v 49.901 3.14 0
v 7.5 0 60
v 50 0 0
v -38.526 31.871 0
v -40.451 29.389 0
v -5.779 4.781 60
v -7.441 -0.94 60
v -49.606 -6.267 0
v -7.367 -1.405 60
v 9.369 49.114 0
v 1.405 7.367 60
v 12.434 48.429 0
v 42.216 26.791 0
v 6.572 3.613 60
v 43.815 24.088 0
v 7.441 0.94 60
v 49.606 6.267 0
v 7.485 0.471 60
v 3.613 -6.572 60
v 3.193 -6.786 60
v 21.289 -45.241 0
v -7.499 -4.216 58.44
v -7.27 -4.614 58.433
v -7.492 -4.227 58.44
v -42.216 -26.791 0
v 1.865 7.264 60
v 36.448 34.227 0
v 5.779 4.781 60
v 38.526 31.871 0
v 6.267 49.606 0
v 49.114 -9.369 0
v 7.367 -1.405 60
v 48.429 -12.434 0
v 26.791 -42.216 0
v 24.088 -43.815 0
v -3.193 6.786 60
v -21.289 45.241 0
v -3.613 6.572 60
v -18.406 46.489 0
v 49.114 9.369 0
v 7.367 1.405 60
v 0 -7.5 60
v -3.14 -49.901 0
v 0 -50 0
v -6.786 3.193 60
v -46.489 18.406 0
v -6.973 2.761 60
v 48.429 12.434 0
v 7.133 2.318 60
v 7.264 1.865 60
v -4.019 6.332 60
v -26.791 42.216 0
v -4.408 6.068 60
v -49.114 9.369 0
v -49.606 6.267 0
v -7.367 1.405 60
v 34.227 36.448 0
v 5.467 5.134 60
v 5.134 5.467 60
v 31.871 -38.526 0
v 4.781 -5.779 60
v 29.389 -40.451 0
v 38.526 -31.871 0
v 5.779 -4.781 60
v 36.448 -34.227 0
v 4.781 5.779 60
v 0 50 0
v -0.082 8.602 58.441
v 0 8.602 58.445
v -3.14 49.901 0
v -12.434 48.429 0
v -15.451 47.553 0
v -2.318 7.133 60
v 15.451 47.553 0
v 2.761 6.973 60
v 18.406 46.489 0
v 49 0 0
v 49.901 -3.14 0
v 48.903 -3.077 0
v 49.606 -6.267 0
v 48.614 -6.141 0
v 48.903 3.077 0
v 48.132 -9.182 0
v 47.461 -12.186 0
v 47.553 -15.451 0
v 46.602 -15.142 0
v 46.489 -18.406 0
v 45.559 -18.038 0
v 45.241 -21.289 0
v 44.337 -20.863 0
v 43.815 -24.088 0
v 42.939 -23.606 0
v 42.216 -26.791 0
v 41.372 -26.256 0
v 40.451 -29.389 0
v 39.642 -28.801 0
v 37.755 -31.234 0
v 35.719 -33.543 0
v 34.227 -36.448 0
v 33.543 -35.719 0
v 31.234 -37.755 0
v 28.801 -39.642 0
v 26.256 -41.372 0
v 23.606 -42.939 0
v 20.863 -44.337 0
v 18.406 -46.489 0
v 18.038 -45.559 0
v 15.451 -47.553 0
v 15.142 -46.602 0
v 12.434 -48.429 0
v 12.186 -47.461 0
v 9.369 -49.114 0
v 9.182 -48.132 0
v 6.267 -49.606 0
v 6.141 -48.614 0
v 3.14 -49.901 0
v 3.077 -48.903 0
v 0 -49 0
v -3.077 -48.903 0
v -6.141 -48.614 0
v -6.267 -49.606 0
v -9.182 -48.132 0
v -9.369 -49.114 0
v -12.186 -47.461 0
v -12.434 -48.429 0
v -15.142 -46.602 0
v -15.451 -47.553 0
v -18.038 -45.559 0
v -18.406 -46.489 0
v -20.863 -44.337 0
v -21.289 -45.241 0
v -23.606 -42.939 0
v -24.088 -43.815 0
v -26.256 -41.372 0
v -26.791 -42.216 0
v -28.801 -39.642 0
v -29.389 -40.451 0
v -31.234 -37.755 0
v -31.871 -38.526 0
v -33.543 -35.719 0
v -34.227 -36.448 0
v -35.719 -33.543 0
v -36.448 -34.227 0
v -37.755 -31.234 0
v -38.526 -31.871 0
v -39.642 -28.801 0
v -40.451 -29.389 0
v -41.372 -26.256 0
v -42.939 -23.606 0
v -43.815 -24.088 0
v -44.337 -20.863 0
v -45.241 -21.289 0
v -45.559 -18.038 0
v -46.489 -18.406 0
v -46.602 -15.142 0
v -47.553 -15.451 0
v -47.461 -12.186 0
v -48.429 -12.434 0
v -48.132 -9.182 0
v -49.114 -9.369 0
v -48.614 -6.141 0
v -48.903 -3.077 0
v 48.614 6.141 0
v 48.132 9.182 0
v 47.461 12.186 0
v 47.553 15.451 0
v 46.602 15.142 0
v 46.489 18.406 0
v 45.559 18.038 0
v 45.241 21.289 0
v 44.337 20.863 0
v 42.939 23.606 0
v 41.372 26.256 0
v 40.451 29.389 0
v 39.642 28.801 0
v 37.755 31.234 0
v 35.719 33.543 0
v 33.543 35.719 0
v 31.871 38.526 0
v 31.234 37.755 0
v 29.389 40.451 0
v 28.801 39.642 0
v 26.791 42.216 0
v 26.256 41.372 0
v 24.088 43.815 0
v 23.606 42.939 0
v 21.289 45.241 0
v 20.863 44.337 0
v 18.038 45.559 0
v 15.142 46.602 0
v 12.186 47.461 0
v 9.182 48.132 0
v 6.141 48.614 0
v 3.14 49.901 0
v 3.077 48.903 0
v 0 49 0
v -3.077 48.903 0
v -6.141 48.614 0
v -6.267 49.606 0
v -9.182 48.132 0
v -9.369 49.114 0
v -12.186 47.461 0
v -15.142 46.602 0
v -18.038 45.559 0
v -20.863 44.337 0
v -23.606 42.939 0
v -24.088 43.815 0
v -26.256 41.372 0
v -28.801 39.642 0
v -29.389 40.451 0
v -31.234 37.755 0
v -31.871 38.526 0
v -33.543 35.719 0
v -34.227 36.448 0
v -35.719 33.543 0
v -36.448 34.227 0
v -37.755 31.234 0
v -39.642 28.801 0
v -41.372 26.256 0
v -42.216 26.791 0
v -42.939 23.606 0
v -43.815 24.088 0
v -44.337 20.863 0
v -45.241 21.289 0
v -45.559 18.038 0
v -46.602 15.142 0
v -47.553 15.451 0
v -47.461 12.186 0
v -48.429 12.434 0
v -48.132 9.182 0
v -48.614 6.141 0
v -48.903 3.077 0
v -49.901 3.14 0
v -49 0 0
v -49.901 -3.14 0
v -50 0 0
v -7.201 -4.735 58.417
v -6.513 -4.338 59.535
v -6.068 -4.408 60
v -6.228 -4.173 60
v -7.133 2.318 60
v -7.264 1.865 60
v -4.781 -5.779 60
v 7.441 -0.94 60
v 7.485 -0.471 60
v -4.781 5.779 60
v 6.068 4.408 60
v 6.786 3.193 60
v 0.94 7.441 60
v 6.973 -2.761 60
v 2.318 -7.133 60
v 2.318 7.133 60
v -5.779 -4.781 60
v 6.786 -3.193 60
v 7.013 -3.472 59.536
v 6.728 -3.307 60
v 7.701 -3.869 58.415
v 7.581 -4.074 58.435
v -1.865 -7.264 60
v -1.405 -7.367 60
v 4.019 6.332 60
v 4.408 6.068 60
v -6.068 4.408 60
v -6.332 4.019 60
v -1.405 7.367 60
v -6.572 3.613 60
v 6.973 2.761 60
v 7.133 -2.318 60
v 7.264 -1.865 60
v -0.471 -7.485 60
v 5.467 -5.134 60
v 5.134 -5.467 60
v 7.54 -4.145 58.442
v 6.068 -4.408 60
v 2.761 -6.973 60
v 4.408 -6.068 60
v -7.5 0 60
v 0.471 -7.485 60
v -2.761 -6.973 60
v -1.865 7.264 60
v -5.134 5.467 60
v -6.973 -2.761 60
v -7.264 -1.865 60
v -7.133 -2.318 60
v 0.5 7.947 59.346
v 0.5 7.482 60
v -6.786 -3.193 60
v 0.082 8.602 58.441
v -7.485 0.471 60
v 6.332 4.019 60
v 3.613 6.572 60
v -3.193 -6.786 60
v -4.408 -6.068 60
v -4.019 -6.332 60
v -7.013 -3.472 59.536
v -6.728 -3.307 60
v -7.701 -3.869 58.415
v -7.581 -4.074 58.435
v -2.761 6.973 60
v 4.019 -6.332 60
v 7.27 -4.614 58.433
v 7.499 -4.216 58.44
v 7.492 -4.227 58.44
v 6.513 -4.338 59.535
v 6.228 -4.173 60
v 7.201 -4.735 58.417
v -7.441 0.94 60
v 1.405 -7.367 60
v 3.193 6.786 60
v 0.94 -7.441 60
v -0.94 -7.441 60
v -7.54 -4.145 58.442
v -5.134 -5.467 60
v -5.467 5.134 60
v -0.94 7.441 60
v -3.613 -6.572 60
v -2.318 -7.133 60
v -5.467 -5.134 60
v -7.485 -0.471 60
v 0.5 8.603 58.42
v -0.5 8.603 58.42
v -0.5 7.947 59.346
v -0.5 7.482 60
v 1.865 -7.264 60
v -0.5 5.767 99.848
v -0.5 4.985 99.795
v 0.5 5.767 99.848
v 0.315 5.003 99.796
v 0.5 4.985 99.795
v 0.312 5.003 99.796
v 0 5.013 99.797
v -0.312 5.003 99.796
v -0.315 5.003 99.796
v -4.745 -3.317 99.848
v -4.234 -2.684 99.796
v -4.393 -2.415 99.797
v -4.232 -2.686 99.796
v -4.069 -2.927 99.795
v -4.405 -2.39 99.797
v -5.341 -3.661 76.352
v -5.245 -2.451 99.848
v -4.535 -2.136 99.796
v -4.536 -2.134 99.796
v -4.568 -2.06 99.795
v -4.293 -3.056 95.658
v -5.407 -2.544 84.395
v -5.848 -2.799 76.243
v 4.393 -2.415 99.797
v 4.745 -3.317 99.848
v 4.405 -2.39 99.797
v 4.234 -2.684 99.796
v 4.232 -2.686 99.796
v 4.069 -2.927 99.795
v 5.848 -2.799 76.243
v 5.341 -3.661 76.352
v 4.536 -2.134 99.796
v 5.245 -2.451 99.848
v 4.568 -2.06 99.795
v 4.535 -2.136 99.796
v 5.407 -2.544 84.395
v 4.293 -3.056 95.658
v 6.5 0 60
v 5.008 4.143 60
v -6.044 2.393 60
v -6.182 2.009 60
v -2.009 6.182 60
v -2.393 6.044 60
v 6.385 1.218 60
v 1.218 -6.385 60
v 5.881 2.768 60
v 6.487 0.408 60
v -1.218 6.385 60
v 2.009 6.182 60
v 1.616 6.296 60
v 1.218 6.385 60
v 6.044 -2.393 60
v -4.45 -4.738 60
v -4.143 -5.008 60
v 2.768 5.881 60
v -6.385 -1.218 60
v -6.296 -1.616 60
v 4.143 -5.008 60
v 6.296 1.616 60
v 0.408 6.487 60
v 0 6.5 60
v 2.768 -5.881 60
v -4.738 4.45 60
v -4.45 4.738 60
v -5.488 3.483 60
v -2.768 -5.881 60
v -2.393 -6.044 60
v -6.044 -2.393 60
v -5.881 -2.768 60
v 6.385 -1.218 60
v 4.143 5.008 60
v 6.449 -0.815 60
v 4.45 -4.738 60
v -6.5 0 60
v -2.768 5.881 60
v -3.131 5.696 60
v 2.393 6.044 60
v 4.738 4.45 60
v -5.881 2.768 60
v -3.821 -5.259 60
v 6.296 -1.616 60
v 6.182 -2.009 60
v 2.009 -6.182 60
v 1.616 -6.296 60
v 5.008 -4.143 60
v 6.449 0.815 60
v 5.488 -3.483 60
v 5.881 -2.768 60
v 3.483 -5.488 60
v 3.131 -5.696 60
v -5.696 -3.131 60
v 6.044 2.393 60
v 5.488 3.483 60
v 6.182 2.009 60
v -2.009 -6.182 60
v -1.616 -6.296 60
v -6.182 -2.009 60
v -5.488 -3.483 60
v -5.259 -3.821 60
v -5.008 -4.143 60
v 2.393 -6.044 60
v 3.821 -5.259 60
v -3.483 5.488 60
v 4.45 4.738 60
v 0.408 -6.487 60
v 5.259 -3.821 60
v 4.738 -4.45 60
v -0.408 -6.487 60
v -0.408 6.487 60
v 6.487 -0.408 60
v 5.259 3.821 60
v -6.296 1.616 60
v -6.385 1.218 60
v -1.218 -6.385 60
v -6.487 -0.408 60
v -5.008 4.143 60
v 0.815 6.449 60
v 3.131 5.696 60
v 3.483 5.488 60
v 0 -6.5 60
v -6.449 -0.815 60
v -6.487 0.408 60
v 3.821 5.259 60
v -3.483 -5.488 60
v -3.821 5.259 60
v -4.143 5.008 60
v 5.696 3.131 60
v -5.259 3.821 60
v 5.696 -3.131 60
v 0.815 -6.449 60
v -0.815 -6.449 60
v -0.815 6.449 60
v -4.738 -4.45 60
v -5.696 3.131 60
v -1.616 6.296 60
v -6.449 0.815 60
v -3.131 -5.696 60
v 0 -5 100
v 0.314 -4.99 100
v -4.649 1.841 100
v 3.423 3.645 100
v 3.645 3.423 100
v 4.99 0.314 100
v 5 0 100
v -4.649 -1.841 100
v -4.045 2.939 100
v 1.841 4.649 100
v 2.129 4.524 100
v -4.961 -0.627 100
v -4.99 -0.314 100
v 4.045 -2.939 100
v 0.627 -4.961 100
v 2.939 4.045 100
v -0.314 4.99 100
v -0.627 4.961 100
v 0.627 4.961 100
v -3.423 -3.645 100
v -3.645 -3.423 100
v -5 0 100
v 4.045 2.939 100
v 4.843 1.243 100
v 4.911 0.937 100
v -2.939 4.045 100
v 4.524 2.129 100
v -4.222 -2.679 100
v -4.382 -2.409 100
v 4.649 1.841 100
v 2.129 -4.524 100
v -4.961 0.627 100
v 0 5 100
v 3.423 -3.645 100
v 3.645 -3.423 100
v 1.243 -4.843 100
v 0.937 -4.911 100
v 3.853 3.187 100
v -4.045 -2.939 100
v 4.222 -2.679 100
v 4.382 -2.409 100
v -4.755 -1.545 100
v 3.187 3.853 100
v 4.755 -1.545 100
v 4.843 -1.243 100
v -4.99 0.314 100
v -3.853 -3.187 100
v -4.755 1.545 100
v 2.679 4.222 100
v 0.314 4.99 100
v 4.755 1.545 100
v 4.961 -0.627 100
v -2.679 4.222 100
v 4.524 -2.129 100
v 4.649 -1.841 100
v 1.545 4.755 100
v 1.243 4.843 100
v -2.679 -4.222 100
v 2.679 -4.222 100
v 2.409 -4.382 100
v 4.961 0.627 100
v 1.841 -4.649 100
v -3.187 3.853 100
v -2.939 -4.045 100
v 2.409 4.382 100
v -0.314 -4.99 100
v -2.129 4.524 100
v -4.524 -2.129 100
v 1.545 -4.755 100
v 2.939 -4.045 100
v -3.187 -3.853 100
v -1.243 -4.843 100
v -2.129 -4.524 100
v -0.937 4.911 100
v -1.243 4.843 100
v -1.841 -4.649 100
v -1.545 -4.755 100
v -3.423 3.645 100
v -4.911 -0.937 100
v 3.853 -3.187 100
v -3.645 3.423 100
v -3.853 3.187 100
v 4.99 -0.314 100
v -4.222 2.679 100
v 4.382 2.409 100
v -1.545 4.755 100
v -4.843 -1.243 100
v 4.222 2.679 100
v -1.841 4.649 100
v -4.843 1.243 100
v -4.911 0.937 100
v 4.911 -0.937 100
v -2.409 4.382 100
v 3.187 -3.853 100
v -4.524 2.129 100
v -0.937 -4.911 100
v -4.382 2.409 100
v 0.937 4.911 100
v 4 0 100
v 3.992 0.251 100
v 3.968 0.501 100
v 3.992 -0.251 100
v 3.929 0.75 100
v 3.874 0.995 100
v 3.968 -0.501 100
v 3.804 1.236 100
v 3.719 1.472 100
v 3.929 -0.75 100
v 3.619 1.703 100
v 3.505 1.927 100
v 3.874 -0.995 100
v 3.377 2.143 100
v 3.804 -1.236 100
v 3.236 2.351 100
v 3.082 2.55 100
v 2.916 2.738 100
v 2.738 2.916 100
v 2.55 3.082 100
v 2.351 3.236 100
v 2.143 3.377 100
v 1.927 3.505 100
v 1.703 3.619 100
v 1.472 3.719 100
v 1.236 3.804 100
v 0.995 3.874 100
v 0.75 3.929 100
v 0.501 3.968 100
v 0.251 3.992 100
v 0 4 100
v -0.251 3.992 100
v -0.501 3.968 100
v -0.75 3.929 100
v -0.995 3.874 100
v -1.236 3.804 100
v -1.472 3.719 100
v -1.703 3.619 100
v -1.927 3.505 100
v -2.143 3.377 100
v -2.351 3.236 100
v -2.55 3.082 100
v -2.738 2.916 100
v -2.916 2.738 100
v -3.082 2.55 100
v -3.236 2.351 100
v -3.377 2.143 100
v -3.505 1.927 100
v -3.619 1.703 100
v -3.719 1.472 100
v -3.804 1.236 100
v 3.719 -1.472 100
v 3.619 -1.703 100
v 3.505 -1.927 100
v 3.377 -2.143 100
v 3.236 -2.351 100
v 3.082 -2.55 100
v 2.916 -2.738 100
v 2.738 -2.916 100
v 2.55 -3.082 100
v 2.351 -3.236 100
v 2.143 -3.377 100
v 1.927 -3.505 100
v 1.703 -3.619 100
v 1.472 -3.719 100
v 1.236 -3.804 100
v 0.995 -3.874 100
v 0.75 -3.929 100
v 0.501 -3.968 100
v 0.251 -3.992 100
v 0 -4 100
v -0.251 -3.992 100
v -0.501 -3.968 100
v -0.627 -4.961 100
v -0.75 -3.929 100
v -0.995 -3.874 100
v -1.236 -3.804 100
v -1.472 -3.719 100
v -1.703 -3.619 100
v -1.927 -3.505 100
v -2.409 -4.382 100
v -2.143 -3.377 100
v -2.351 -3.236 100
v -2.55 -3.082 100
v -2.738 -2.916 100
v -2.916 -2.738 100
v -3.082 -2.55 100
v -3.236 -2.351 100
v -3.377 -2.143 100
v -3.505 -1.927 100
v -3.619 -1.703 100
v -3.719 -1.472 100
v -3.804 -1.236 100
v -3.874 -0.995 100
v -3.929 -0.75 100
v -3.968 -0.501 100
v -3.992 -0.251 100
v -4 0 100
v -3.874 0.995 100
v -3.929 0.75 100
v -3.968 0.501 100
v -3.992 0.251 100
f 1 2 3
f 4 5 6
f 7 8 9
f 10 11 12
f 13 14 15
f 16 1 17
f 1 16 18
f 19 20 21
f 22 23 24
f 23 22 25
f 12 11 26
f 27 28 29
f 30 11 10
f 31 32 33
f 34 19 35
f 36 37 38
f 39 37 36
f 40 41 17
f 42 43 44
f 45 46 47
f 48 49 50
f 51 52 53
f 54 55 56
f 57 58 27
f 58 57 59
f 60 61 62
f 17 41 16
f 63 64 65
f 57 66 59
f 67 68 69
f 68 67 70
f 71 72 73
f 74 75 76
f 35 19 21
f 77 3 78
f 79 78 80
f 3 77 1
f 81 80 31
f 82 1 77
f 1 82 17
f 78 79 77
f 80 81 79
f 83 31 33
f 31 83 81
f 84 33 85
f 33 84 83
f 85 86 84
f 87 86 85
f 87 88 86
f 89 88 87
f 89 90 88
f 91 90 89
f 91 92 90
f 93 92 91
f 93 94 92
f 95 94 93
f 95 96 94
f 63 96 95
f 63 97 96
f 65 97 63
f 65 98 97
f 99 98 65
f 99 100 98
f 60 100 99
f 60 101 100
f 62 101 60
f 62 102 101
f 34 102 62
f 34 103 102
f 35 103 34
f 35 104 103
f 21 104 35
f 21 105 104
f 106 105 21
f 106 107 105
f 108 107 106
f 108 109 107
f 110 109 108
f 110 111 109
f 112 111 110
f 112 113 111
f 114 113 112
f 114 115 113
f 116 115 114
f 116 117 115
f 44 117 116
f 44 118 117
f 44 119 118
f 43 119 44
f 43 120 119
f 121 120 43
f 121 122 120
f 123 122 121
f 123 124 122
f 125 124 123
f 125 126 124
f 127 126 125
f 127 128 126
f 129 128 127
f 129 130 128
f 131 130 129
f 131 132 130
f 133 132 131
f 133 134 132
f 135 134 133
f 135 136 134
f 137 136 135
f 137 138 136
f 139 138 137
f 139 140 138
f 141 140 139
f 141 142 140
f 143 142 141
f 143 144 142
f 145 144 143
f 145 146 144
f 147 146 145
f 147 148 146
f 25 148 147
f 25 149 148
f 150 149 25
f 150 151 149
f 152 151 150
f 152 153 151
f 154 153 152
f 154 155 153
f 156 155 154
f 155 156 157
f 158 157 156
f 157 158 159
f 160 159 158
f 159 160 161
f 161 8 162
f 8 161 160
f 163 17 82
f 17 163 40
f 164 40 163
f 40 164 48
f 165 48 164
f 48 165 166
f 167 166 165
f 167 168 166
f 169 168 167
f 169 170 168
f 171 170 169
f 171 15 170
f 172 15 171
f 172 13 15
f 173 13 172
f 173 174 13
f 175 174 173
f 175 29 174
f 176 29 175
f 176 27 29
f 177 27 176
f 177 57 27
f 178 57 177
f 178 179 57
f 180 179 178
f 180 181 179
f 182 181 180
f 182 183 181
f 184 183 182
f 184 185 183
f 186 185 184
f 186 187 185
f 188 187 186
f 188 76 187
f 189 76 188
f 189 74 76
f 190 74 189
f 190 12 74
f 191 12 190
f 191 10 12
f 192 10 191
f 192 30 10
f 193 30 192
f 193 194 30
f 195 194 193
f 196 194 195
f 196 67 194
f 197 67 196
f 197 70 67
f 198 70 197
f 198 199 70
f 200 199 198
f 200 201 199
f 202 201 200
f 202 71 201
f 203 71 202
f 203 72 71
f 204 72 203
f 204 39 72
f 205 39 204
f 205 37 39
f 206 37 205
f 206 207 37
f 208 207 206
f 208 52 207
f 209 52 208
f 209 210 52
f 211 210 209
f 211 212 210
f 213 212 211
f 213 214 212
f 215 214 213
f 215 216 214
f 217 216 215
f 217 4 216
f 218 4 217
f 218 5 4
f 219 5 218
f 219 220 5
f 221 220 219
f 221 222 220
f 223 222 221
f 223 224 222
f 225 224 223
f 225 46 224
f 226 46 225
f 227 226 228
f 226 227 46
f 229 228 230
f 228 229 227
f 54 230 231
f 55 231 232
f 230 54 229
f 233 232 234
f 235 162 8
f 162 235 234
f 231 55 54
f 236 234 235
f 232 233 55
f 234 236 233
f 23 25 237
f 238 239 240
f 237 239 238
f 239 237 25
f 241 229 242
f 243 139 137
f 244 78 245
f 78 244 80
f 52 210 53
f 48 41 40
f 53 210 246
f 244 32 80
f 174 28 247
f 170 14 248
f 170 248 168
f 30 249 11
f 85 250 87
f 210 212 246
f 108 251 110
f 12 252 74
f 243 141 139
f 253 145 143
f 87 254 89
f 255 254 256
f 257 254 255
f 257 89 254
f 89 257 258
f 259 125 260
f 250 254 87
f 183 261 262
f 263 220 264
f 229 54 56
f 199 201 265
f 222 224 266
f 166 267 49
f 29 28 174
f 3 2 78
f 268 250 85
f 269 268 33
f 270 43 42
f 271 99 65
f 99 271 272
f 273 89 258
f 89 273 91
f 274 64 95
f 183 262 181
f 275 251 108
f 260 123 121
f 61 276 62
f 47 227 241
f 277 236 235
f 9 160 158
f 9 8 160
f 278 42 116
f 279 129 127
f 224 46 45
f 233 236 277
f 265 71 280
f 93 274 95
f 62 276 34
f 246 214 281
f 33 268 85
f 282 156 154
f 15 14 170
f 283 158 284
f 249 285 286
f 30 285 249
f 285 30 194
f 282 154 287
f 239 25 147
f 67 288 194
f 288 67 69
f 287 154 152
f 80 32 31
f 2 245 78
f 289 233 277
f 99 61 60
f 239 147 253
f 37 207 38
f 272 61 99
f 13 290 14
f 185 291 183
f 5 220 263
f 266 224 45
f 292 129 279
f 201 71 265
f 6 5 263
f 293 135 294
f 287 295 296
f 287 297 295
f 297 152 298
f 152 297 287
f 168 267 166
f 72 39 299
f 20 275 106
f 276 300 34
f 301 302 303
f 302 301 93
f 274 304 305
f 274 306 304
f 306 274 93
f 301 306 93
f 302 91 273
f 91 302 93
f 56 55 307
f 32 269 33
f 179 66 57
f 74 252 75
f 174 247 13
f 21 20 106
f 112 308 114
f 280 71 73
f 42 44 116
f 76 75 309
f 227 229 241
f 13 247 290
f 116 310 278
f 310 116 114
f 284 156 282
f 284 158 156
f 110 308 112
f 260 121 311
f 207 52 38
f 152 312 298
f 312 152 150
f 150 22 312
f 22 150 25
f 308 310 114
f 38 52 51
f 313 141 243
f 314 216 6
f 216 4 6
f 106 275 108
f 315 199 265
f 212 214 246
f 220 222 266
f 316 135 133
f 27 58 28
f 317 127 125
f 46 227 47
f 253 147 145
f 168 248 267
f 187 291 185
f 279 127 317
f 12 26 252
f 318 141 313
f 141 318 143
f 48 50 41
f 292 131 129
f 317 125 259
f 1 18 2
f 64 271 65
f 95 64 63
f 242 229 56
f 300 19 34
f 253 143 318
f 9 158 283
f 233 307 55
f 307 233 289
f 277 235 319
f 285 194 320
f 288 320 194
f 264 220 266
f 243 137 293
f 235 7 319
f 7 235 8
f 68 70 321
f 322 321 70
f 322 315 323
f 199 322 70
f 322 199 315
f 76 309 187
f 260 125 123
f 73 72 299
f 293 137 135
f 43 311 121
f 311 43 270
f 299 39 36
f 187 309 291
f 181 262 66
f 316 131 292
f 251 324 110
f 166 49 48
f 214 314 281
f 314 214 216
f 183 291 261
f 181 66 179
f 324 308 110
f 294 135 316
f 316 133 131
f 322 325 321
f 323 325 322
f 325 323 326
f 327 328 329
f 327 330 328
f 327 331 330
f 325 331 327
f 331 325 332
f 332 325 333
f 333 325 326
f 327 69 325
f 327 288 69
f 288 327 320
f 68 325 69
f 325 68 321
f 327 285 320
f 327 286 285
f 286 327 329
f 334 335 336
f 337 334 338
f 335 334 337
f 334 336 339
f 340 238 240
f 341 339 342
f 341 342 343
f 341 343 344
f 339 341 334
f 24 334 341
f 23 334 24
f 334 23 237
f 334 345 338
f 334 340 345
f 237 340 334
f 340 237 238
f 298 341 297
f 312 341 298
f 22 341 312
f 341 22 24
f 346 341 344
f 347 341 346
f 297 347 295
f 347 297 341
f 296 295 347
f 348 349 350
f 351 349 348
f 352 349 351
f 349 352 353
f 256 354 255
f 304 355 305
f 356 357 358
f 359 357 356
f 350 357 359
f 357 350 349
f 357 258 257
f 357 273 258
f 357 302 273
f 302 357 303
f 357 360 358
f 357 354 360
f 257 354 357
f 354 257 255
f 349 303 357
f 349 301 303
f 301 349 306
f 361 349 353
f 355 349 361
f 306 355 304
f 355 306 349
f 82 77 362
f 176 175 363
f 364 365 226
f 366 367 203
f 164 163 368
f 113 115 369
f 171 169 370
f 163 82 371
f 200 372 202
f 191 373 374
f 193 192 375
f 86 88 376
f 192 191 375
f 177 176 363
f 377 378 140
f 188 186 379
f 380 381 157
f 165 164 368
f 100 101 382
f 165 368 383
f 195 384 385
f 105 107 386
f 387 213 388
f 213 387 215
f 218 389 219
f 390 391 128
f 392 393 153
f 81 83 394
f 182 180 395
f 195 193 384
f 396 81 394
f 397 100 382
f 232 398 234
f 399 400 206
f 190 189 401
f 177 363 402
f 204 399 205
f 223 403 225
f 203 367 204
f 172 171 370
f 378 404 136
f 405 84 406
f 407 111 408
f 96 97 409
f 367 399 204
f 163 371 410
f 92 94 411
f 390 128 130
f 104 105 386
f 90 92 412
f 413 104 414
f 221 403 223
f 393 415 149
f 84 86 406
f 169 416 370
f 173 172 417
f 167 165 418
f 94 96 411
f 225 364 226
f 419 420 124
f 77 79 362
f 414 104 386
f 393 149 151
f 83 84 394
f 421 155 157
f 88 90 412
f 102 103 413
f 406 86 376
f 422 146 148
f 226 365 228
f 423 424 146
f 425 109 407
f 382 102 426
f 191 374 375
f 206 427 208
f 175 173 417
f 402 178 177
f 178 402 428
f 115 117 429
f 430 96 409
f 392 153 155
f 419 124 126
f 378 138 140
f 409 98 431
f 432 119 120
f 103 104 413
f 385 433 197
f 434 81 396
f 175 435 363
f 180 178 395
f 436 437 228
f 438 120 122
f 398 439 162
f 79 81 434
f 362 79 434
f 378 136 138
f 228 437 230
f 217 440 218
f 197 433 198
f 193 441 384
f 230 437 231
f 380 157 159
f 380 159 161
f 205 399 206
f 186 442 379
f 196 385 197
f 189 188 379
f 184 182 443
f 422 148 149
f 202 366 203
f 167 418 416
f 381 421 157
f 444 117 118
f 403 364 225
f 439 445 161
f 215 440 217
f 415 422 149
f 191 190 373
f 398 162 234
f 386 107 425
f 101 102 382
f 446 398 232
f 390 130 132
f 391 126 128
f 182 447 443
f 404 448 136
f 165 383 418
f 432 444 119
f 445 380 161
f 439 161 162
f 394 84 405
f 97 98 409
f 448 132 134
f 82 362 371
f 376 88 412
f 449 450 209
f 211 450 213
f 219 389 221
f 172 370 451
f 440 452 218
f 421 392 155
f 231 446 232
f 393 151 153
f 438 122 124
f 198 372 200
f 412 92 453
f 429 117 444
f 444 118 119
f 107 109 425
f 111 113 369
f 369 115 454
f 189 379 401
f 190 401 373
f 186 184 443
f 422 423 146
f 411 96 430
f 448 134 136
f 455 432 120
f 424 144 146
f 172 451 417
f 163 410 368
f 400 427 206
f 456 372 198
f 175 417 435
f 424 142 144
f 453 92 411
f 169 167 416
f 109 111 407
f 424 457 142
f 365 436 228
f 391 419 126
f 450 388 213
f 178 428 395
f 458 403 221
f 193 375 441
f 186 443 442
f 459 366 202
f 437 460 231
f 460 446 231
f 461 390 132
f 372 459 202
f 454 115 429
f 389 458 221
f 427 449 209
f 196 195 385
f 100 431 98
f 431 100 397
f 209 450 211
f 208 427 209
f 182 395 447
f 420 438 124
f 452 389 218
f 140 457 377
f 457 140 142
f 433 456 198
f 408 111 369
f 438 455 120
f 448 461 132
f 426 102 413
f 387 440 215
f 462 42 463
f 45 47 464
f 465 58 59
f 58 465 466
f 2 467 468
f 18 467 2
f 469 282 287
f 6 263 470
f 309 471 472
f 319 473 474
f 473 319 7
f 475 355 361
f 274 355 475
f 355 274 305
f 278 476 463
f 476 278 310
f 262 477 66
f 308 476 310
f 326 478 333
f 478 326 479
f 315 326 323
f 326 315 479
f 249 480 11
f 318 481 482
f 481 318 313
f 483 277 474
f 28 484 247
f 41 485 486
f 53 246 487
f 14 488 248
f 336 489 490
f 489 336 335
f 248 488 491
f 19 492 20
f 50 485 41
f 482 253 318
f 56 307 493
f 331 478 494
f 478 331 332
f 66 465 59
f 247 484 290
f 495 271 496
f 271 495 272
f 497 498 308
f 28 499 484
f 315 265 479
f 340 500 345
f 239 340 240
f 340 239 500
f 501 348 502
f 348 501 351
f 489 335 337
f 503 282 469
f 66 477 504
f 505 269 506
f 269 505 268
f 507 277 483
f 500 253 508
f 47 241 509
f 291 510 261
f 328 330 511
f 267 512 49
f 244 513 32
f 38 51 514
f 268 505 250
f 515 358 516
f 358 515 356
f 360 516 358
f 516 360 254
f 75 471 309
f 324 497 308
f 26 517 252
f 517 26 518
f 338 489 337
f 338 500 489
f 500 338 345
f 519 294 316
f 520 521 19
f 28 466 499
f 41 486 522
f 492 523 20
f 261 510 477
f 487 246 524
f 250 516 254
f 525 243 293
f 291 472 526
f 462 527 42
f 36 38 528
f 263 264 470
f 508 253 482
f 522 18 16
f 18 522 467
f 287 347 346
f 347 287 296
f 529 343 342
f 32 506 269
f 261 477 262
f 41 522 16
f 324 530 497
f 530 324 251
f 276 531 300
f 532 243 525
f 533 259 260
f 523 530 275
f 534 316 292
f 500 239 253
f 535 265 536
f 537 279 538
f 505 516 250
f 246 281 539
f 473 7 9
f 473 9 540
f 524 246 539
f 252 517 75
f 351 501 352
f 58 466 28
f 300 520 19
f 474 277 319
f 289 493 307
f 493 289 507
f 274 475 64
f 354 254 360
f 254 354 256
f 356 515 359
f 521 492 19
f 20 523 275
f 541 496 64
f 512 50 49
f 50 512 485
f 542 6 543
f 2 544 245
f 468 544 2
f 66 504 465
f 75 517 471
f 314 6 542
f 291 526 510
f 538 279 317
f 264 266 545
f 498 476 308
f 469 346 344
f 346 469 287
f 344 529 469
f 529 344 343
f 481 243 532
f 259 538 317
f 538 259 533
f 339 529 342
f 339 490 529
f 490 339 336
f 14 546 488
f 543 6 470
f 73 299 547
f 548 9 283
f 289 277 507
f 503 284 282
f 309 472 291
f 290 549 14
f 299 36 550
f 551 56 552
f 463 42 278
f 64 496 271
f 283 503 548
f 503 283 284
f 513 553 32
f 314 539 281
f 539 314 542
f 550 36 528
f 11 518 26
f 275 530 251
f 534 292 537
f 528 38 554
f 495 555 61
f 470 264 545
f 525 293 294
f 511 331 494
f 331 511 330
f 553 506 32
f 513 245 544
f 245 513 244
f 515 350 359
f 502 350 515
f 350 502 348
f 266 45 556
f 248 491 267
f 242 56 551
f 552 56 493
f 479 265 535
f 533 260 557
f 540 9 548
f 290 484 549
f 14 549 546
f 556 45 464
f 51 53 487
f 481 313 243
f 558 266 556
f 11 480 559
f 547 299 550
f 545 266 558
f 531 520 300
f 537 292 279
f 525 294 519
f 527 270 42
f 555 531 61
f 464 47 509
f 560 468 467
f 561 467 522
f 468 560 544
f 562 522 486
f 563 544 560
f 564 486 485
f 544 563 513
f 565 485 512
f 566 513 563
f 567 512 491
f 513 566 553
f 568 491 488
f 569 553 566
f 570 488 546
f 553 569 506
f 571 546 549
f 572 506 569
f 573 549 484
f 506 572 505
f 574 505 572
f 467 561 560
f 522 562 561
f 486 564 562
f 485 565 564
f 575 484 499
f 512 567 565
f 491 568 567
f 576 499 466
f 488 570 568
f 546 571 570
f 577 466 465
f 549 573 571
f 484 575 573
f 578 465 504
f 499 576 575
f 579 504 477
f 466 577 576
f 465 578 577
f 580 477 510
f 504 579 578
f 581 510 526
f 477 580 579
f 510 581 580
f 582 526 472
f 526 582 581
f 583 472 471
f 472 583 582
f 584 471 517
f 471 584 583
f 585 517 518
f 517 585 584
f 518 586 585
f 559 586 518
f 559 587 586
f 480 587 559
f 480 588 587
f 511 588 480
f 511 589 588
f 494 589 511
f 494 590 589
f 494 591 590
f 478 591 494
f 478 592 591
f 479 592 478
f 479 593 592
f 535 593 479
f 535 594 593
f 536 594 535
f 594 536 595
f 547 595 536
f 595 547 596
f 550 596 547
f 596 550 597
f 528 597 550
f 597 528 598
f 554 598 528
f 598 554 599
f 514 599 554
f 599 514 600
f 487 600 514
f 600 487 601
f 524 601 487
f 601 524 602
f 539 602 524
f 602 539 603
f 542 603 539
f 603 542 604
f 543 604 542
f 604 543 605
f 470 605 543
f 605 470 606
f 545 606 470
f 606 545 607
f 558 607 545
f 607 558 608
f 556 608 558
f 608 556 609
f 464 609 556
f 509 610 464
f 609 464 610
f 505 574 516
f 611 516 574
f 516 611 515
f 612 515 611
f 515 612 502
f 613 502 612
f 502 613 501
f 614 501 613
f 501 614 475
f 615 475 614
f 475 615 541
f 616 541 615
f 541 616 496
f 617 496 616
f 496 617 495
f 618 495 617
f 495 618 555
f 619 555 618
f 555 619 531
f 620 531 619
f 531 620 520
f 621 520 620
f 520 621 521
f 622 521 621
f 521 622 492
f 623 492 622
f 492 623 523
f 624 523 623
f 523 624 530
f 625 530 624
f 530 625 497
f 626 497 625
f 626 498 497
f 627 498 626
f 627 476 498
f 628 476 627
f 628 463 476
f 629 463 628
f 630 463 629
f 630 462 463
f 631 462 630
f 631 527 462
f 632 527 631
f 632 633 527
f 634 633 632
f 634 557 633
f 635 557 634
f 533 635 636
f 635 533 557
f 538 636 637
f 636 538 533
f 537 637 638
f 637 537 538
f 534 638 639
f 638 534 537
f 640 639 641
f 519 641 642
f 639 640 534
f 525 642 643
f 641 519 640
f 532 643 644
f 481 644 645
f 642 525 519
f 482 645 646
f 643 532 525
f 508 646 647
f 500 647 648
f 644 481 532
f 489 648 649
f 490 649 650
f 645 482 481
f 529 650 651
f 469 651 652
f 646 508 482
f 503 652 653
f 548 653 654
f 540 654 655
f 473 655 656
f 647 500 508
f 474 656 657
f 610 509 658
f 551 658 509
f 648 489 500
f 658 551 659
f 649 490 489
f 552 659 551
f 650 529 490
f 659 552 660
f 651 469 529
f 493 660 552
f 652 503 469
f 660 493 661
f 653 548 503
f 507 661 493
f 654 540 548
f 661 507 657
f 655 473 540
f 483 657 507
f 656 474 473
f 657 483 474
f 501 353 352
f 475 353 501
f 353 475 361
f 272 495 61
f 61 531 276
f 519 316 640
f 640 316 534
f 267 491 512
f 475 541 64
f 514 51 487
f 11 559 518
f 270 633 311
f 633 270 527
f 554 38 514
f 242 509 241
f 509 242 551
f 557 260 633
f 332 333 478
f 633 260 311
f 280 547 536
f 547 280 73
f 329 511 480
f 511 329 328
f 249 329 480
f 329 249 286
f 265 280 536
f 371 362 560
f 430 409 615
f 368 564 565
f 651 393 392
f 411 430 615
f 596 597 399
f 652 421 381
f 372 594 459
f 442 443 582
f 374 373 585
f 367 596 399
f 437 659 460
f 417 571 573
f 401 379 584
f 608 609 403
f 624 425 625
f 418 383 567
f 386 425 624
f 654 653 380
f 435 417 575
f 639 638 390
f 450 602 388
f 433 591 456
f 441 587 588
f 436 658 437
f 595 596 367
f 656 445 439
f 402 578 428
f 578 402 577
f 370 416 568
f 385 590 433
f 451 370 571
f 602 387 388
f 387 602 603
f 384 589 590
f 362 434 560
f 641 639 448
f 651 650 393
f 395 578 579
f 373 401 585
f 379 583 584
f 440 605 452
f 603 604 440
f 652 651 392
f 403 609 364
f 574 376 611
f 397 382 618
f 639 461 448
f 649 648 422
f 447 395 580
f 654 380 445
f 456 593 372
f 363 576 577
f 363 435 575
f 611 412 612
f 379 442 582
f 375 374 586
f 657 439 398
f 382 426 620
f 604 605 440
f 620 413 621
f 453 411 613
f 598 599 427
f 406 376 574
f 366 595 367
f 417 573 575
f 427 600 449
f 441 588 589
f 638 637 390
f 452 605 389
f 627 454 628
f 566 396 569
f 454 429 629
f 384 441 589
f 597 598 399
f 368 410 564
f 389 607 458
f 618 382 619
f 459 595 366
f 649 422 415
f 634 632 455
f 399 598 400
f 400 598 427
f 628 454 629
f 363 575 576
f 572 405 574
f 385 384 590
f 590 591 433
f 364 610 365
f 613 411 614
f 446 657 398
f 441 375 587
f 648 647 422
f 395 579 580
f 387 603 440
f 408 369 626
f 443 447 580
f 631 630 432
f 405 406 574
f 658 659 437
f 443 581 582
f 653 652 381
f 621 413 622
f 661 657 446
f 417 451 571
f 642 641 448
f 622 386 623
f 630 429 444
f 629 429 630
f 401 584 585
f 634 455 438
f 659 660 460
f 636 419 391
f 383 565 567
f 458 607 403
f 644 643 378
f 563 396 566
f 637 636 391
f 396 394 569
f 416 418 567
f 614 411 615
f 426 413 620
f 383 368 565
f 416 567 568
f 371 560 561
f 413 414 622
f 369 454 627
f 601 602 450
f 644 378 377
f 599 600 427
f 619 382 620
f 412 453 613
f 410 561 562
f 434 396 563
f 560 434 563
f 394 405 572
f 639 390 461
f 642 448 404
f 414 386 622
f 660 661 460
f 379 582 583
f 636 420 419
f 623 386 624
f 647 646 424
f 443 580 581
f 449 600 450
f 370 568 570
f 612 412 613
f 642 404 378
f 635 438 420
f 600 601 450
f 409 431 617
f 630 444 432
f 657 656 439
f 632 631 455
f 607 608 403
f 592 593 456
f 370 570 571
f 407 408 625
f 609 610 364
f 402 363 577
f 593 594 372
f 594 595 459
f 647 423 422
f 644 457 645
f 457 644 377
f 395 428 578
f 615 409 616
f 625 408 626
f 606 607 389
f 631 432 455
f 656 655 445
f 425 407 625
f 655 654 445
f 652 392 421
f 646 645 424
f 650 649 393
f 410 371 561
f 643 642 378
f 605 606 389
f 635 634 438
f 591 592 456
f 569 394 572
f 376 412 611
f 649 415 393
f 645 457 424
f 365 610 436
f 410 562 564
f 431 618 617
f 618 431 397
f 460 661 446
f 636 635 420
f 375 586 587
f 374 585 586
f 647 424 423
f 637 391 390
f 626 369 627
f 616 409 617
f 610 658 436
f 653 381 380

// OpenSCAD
// variables
size = 100; // [50:S,100:M,150:L,200:XL]
wallthickness = 1; // [0.5:S,1:M,1.5:L]
resolution = 100; // [100:rough,150:middle,200:fine]

// model
union(){
	difference(){
		union(){
			translate([0,0,0])cylinder(h = size*0.6, r1 = size/2, r2 = size*0.15/2, $fn = resolution);
			translate([-0.5,-0.6,0]) translate([0,size*0.12,0]) rotate([1/tan(size*0.1/(size*0.4)*180/PI),0,0]) cube([1,1.2,size]);
			rotate([0,0,120]) translate([-0.5,-0.6,0]) translate([0,size*0.12,0]) rotate([1/tan(size*0.1/(size*0.4)*180/PI),0,0]) cube([1,1.2,size]);
			rotate([0,0,240]) translate([-0.5,-0.6,0]) translate([0,size*0.12,0]) rotate([1/tan(size*0.1/(size*0.4)*180/PI),0,0]) cube([1,1.2,size]);
		}
		translate([0,0,0])cylinder(h = size*0.6, r1 = (size)/2-wallthickness, r2 = (size)*0.15/2-wallthickness, $fn = resolution);
	}
	difference(){
		translate([0,0,size*0.6])cylinder(h = size*0.4, r1 = size*0.15/2, r2 = size*0.1/2, $fn = resolution);
		translate([0,0,size*0.6])cylinder(h = size*0.4, r1 = (size)*0.15/2-wallthickness, r2 = (size)*0.1/2-wallthickness, $fn = resolution);
	}
}
